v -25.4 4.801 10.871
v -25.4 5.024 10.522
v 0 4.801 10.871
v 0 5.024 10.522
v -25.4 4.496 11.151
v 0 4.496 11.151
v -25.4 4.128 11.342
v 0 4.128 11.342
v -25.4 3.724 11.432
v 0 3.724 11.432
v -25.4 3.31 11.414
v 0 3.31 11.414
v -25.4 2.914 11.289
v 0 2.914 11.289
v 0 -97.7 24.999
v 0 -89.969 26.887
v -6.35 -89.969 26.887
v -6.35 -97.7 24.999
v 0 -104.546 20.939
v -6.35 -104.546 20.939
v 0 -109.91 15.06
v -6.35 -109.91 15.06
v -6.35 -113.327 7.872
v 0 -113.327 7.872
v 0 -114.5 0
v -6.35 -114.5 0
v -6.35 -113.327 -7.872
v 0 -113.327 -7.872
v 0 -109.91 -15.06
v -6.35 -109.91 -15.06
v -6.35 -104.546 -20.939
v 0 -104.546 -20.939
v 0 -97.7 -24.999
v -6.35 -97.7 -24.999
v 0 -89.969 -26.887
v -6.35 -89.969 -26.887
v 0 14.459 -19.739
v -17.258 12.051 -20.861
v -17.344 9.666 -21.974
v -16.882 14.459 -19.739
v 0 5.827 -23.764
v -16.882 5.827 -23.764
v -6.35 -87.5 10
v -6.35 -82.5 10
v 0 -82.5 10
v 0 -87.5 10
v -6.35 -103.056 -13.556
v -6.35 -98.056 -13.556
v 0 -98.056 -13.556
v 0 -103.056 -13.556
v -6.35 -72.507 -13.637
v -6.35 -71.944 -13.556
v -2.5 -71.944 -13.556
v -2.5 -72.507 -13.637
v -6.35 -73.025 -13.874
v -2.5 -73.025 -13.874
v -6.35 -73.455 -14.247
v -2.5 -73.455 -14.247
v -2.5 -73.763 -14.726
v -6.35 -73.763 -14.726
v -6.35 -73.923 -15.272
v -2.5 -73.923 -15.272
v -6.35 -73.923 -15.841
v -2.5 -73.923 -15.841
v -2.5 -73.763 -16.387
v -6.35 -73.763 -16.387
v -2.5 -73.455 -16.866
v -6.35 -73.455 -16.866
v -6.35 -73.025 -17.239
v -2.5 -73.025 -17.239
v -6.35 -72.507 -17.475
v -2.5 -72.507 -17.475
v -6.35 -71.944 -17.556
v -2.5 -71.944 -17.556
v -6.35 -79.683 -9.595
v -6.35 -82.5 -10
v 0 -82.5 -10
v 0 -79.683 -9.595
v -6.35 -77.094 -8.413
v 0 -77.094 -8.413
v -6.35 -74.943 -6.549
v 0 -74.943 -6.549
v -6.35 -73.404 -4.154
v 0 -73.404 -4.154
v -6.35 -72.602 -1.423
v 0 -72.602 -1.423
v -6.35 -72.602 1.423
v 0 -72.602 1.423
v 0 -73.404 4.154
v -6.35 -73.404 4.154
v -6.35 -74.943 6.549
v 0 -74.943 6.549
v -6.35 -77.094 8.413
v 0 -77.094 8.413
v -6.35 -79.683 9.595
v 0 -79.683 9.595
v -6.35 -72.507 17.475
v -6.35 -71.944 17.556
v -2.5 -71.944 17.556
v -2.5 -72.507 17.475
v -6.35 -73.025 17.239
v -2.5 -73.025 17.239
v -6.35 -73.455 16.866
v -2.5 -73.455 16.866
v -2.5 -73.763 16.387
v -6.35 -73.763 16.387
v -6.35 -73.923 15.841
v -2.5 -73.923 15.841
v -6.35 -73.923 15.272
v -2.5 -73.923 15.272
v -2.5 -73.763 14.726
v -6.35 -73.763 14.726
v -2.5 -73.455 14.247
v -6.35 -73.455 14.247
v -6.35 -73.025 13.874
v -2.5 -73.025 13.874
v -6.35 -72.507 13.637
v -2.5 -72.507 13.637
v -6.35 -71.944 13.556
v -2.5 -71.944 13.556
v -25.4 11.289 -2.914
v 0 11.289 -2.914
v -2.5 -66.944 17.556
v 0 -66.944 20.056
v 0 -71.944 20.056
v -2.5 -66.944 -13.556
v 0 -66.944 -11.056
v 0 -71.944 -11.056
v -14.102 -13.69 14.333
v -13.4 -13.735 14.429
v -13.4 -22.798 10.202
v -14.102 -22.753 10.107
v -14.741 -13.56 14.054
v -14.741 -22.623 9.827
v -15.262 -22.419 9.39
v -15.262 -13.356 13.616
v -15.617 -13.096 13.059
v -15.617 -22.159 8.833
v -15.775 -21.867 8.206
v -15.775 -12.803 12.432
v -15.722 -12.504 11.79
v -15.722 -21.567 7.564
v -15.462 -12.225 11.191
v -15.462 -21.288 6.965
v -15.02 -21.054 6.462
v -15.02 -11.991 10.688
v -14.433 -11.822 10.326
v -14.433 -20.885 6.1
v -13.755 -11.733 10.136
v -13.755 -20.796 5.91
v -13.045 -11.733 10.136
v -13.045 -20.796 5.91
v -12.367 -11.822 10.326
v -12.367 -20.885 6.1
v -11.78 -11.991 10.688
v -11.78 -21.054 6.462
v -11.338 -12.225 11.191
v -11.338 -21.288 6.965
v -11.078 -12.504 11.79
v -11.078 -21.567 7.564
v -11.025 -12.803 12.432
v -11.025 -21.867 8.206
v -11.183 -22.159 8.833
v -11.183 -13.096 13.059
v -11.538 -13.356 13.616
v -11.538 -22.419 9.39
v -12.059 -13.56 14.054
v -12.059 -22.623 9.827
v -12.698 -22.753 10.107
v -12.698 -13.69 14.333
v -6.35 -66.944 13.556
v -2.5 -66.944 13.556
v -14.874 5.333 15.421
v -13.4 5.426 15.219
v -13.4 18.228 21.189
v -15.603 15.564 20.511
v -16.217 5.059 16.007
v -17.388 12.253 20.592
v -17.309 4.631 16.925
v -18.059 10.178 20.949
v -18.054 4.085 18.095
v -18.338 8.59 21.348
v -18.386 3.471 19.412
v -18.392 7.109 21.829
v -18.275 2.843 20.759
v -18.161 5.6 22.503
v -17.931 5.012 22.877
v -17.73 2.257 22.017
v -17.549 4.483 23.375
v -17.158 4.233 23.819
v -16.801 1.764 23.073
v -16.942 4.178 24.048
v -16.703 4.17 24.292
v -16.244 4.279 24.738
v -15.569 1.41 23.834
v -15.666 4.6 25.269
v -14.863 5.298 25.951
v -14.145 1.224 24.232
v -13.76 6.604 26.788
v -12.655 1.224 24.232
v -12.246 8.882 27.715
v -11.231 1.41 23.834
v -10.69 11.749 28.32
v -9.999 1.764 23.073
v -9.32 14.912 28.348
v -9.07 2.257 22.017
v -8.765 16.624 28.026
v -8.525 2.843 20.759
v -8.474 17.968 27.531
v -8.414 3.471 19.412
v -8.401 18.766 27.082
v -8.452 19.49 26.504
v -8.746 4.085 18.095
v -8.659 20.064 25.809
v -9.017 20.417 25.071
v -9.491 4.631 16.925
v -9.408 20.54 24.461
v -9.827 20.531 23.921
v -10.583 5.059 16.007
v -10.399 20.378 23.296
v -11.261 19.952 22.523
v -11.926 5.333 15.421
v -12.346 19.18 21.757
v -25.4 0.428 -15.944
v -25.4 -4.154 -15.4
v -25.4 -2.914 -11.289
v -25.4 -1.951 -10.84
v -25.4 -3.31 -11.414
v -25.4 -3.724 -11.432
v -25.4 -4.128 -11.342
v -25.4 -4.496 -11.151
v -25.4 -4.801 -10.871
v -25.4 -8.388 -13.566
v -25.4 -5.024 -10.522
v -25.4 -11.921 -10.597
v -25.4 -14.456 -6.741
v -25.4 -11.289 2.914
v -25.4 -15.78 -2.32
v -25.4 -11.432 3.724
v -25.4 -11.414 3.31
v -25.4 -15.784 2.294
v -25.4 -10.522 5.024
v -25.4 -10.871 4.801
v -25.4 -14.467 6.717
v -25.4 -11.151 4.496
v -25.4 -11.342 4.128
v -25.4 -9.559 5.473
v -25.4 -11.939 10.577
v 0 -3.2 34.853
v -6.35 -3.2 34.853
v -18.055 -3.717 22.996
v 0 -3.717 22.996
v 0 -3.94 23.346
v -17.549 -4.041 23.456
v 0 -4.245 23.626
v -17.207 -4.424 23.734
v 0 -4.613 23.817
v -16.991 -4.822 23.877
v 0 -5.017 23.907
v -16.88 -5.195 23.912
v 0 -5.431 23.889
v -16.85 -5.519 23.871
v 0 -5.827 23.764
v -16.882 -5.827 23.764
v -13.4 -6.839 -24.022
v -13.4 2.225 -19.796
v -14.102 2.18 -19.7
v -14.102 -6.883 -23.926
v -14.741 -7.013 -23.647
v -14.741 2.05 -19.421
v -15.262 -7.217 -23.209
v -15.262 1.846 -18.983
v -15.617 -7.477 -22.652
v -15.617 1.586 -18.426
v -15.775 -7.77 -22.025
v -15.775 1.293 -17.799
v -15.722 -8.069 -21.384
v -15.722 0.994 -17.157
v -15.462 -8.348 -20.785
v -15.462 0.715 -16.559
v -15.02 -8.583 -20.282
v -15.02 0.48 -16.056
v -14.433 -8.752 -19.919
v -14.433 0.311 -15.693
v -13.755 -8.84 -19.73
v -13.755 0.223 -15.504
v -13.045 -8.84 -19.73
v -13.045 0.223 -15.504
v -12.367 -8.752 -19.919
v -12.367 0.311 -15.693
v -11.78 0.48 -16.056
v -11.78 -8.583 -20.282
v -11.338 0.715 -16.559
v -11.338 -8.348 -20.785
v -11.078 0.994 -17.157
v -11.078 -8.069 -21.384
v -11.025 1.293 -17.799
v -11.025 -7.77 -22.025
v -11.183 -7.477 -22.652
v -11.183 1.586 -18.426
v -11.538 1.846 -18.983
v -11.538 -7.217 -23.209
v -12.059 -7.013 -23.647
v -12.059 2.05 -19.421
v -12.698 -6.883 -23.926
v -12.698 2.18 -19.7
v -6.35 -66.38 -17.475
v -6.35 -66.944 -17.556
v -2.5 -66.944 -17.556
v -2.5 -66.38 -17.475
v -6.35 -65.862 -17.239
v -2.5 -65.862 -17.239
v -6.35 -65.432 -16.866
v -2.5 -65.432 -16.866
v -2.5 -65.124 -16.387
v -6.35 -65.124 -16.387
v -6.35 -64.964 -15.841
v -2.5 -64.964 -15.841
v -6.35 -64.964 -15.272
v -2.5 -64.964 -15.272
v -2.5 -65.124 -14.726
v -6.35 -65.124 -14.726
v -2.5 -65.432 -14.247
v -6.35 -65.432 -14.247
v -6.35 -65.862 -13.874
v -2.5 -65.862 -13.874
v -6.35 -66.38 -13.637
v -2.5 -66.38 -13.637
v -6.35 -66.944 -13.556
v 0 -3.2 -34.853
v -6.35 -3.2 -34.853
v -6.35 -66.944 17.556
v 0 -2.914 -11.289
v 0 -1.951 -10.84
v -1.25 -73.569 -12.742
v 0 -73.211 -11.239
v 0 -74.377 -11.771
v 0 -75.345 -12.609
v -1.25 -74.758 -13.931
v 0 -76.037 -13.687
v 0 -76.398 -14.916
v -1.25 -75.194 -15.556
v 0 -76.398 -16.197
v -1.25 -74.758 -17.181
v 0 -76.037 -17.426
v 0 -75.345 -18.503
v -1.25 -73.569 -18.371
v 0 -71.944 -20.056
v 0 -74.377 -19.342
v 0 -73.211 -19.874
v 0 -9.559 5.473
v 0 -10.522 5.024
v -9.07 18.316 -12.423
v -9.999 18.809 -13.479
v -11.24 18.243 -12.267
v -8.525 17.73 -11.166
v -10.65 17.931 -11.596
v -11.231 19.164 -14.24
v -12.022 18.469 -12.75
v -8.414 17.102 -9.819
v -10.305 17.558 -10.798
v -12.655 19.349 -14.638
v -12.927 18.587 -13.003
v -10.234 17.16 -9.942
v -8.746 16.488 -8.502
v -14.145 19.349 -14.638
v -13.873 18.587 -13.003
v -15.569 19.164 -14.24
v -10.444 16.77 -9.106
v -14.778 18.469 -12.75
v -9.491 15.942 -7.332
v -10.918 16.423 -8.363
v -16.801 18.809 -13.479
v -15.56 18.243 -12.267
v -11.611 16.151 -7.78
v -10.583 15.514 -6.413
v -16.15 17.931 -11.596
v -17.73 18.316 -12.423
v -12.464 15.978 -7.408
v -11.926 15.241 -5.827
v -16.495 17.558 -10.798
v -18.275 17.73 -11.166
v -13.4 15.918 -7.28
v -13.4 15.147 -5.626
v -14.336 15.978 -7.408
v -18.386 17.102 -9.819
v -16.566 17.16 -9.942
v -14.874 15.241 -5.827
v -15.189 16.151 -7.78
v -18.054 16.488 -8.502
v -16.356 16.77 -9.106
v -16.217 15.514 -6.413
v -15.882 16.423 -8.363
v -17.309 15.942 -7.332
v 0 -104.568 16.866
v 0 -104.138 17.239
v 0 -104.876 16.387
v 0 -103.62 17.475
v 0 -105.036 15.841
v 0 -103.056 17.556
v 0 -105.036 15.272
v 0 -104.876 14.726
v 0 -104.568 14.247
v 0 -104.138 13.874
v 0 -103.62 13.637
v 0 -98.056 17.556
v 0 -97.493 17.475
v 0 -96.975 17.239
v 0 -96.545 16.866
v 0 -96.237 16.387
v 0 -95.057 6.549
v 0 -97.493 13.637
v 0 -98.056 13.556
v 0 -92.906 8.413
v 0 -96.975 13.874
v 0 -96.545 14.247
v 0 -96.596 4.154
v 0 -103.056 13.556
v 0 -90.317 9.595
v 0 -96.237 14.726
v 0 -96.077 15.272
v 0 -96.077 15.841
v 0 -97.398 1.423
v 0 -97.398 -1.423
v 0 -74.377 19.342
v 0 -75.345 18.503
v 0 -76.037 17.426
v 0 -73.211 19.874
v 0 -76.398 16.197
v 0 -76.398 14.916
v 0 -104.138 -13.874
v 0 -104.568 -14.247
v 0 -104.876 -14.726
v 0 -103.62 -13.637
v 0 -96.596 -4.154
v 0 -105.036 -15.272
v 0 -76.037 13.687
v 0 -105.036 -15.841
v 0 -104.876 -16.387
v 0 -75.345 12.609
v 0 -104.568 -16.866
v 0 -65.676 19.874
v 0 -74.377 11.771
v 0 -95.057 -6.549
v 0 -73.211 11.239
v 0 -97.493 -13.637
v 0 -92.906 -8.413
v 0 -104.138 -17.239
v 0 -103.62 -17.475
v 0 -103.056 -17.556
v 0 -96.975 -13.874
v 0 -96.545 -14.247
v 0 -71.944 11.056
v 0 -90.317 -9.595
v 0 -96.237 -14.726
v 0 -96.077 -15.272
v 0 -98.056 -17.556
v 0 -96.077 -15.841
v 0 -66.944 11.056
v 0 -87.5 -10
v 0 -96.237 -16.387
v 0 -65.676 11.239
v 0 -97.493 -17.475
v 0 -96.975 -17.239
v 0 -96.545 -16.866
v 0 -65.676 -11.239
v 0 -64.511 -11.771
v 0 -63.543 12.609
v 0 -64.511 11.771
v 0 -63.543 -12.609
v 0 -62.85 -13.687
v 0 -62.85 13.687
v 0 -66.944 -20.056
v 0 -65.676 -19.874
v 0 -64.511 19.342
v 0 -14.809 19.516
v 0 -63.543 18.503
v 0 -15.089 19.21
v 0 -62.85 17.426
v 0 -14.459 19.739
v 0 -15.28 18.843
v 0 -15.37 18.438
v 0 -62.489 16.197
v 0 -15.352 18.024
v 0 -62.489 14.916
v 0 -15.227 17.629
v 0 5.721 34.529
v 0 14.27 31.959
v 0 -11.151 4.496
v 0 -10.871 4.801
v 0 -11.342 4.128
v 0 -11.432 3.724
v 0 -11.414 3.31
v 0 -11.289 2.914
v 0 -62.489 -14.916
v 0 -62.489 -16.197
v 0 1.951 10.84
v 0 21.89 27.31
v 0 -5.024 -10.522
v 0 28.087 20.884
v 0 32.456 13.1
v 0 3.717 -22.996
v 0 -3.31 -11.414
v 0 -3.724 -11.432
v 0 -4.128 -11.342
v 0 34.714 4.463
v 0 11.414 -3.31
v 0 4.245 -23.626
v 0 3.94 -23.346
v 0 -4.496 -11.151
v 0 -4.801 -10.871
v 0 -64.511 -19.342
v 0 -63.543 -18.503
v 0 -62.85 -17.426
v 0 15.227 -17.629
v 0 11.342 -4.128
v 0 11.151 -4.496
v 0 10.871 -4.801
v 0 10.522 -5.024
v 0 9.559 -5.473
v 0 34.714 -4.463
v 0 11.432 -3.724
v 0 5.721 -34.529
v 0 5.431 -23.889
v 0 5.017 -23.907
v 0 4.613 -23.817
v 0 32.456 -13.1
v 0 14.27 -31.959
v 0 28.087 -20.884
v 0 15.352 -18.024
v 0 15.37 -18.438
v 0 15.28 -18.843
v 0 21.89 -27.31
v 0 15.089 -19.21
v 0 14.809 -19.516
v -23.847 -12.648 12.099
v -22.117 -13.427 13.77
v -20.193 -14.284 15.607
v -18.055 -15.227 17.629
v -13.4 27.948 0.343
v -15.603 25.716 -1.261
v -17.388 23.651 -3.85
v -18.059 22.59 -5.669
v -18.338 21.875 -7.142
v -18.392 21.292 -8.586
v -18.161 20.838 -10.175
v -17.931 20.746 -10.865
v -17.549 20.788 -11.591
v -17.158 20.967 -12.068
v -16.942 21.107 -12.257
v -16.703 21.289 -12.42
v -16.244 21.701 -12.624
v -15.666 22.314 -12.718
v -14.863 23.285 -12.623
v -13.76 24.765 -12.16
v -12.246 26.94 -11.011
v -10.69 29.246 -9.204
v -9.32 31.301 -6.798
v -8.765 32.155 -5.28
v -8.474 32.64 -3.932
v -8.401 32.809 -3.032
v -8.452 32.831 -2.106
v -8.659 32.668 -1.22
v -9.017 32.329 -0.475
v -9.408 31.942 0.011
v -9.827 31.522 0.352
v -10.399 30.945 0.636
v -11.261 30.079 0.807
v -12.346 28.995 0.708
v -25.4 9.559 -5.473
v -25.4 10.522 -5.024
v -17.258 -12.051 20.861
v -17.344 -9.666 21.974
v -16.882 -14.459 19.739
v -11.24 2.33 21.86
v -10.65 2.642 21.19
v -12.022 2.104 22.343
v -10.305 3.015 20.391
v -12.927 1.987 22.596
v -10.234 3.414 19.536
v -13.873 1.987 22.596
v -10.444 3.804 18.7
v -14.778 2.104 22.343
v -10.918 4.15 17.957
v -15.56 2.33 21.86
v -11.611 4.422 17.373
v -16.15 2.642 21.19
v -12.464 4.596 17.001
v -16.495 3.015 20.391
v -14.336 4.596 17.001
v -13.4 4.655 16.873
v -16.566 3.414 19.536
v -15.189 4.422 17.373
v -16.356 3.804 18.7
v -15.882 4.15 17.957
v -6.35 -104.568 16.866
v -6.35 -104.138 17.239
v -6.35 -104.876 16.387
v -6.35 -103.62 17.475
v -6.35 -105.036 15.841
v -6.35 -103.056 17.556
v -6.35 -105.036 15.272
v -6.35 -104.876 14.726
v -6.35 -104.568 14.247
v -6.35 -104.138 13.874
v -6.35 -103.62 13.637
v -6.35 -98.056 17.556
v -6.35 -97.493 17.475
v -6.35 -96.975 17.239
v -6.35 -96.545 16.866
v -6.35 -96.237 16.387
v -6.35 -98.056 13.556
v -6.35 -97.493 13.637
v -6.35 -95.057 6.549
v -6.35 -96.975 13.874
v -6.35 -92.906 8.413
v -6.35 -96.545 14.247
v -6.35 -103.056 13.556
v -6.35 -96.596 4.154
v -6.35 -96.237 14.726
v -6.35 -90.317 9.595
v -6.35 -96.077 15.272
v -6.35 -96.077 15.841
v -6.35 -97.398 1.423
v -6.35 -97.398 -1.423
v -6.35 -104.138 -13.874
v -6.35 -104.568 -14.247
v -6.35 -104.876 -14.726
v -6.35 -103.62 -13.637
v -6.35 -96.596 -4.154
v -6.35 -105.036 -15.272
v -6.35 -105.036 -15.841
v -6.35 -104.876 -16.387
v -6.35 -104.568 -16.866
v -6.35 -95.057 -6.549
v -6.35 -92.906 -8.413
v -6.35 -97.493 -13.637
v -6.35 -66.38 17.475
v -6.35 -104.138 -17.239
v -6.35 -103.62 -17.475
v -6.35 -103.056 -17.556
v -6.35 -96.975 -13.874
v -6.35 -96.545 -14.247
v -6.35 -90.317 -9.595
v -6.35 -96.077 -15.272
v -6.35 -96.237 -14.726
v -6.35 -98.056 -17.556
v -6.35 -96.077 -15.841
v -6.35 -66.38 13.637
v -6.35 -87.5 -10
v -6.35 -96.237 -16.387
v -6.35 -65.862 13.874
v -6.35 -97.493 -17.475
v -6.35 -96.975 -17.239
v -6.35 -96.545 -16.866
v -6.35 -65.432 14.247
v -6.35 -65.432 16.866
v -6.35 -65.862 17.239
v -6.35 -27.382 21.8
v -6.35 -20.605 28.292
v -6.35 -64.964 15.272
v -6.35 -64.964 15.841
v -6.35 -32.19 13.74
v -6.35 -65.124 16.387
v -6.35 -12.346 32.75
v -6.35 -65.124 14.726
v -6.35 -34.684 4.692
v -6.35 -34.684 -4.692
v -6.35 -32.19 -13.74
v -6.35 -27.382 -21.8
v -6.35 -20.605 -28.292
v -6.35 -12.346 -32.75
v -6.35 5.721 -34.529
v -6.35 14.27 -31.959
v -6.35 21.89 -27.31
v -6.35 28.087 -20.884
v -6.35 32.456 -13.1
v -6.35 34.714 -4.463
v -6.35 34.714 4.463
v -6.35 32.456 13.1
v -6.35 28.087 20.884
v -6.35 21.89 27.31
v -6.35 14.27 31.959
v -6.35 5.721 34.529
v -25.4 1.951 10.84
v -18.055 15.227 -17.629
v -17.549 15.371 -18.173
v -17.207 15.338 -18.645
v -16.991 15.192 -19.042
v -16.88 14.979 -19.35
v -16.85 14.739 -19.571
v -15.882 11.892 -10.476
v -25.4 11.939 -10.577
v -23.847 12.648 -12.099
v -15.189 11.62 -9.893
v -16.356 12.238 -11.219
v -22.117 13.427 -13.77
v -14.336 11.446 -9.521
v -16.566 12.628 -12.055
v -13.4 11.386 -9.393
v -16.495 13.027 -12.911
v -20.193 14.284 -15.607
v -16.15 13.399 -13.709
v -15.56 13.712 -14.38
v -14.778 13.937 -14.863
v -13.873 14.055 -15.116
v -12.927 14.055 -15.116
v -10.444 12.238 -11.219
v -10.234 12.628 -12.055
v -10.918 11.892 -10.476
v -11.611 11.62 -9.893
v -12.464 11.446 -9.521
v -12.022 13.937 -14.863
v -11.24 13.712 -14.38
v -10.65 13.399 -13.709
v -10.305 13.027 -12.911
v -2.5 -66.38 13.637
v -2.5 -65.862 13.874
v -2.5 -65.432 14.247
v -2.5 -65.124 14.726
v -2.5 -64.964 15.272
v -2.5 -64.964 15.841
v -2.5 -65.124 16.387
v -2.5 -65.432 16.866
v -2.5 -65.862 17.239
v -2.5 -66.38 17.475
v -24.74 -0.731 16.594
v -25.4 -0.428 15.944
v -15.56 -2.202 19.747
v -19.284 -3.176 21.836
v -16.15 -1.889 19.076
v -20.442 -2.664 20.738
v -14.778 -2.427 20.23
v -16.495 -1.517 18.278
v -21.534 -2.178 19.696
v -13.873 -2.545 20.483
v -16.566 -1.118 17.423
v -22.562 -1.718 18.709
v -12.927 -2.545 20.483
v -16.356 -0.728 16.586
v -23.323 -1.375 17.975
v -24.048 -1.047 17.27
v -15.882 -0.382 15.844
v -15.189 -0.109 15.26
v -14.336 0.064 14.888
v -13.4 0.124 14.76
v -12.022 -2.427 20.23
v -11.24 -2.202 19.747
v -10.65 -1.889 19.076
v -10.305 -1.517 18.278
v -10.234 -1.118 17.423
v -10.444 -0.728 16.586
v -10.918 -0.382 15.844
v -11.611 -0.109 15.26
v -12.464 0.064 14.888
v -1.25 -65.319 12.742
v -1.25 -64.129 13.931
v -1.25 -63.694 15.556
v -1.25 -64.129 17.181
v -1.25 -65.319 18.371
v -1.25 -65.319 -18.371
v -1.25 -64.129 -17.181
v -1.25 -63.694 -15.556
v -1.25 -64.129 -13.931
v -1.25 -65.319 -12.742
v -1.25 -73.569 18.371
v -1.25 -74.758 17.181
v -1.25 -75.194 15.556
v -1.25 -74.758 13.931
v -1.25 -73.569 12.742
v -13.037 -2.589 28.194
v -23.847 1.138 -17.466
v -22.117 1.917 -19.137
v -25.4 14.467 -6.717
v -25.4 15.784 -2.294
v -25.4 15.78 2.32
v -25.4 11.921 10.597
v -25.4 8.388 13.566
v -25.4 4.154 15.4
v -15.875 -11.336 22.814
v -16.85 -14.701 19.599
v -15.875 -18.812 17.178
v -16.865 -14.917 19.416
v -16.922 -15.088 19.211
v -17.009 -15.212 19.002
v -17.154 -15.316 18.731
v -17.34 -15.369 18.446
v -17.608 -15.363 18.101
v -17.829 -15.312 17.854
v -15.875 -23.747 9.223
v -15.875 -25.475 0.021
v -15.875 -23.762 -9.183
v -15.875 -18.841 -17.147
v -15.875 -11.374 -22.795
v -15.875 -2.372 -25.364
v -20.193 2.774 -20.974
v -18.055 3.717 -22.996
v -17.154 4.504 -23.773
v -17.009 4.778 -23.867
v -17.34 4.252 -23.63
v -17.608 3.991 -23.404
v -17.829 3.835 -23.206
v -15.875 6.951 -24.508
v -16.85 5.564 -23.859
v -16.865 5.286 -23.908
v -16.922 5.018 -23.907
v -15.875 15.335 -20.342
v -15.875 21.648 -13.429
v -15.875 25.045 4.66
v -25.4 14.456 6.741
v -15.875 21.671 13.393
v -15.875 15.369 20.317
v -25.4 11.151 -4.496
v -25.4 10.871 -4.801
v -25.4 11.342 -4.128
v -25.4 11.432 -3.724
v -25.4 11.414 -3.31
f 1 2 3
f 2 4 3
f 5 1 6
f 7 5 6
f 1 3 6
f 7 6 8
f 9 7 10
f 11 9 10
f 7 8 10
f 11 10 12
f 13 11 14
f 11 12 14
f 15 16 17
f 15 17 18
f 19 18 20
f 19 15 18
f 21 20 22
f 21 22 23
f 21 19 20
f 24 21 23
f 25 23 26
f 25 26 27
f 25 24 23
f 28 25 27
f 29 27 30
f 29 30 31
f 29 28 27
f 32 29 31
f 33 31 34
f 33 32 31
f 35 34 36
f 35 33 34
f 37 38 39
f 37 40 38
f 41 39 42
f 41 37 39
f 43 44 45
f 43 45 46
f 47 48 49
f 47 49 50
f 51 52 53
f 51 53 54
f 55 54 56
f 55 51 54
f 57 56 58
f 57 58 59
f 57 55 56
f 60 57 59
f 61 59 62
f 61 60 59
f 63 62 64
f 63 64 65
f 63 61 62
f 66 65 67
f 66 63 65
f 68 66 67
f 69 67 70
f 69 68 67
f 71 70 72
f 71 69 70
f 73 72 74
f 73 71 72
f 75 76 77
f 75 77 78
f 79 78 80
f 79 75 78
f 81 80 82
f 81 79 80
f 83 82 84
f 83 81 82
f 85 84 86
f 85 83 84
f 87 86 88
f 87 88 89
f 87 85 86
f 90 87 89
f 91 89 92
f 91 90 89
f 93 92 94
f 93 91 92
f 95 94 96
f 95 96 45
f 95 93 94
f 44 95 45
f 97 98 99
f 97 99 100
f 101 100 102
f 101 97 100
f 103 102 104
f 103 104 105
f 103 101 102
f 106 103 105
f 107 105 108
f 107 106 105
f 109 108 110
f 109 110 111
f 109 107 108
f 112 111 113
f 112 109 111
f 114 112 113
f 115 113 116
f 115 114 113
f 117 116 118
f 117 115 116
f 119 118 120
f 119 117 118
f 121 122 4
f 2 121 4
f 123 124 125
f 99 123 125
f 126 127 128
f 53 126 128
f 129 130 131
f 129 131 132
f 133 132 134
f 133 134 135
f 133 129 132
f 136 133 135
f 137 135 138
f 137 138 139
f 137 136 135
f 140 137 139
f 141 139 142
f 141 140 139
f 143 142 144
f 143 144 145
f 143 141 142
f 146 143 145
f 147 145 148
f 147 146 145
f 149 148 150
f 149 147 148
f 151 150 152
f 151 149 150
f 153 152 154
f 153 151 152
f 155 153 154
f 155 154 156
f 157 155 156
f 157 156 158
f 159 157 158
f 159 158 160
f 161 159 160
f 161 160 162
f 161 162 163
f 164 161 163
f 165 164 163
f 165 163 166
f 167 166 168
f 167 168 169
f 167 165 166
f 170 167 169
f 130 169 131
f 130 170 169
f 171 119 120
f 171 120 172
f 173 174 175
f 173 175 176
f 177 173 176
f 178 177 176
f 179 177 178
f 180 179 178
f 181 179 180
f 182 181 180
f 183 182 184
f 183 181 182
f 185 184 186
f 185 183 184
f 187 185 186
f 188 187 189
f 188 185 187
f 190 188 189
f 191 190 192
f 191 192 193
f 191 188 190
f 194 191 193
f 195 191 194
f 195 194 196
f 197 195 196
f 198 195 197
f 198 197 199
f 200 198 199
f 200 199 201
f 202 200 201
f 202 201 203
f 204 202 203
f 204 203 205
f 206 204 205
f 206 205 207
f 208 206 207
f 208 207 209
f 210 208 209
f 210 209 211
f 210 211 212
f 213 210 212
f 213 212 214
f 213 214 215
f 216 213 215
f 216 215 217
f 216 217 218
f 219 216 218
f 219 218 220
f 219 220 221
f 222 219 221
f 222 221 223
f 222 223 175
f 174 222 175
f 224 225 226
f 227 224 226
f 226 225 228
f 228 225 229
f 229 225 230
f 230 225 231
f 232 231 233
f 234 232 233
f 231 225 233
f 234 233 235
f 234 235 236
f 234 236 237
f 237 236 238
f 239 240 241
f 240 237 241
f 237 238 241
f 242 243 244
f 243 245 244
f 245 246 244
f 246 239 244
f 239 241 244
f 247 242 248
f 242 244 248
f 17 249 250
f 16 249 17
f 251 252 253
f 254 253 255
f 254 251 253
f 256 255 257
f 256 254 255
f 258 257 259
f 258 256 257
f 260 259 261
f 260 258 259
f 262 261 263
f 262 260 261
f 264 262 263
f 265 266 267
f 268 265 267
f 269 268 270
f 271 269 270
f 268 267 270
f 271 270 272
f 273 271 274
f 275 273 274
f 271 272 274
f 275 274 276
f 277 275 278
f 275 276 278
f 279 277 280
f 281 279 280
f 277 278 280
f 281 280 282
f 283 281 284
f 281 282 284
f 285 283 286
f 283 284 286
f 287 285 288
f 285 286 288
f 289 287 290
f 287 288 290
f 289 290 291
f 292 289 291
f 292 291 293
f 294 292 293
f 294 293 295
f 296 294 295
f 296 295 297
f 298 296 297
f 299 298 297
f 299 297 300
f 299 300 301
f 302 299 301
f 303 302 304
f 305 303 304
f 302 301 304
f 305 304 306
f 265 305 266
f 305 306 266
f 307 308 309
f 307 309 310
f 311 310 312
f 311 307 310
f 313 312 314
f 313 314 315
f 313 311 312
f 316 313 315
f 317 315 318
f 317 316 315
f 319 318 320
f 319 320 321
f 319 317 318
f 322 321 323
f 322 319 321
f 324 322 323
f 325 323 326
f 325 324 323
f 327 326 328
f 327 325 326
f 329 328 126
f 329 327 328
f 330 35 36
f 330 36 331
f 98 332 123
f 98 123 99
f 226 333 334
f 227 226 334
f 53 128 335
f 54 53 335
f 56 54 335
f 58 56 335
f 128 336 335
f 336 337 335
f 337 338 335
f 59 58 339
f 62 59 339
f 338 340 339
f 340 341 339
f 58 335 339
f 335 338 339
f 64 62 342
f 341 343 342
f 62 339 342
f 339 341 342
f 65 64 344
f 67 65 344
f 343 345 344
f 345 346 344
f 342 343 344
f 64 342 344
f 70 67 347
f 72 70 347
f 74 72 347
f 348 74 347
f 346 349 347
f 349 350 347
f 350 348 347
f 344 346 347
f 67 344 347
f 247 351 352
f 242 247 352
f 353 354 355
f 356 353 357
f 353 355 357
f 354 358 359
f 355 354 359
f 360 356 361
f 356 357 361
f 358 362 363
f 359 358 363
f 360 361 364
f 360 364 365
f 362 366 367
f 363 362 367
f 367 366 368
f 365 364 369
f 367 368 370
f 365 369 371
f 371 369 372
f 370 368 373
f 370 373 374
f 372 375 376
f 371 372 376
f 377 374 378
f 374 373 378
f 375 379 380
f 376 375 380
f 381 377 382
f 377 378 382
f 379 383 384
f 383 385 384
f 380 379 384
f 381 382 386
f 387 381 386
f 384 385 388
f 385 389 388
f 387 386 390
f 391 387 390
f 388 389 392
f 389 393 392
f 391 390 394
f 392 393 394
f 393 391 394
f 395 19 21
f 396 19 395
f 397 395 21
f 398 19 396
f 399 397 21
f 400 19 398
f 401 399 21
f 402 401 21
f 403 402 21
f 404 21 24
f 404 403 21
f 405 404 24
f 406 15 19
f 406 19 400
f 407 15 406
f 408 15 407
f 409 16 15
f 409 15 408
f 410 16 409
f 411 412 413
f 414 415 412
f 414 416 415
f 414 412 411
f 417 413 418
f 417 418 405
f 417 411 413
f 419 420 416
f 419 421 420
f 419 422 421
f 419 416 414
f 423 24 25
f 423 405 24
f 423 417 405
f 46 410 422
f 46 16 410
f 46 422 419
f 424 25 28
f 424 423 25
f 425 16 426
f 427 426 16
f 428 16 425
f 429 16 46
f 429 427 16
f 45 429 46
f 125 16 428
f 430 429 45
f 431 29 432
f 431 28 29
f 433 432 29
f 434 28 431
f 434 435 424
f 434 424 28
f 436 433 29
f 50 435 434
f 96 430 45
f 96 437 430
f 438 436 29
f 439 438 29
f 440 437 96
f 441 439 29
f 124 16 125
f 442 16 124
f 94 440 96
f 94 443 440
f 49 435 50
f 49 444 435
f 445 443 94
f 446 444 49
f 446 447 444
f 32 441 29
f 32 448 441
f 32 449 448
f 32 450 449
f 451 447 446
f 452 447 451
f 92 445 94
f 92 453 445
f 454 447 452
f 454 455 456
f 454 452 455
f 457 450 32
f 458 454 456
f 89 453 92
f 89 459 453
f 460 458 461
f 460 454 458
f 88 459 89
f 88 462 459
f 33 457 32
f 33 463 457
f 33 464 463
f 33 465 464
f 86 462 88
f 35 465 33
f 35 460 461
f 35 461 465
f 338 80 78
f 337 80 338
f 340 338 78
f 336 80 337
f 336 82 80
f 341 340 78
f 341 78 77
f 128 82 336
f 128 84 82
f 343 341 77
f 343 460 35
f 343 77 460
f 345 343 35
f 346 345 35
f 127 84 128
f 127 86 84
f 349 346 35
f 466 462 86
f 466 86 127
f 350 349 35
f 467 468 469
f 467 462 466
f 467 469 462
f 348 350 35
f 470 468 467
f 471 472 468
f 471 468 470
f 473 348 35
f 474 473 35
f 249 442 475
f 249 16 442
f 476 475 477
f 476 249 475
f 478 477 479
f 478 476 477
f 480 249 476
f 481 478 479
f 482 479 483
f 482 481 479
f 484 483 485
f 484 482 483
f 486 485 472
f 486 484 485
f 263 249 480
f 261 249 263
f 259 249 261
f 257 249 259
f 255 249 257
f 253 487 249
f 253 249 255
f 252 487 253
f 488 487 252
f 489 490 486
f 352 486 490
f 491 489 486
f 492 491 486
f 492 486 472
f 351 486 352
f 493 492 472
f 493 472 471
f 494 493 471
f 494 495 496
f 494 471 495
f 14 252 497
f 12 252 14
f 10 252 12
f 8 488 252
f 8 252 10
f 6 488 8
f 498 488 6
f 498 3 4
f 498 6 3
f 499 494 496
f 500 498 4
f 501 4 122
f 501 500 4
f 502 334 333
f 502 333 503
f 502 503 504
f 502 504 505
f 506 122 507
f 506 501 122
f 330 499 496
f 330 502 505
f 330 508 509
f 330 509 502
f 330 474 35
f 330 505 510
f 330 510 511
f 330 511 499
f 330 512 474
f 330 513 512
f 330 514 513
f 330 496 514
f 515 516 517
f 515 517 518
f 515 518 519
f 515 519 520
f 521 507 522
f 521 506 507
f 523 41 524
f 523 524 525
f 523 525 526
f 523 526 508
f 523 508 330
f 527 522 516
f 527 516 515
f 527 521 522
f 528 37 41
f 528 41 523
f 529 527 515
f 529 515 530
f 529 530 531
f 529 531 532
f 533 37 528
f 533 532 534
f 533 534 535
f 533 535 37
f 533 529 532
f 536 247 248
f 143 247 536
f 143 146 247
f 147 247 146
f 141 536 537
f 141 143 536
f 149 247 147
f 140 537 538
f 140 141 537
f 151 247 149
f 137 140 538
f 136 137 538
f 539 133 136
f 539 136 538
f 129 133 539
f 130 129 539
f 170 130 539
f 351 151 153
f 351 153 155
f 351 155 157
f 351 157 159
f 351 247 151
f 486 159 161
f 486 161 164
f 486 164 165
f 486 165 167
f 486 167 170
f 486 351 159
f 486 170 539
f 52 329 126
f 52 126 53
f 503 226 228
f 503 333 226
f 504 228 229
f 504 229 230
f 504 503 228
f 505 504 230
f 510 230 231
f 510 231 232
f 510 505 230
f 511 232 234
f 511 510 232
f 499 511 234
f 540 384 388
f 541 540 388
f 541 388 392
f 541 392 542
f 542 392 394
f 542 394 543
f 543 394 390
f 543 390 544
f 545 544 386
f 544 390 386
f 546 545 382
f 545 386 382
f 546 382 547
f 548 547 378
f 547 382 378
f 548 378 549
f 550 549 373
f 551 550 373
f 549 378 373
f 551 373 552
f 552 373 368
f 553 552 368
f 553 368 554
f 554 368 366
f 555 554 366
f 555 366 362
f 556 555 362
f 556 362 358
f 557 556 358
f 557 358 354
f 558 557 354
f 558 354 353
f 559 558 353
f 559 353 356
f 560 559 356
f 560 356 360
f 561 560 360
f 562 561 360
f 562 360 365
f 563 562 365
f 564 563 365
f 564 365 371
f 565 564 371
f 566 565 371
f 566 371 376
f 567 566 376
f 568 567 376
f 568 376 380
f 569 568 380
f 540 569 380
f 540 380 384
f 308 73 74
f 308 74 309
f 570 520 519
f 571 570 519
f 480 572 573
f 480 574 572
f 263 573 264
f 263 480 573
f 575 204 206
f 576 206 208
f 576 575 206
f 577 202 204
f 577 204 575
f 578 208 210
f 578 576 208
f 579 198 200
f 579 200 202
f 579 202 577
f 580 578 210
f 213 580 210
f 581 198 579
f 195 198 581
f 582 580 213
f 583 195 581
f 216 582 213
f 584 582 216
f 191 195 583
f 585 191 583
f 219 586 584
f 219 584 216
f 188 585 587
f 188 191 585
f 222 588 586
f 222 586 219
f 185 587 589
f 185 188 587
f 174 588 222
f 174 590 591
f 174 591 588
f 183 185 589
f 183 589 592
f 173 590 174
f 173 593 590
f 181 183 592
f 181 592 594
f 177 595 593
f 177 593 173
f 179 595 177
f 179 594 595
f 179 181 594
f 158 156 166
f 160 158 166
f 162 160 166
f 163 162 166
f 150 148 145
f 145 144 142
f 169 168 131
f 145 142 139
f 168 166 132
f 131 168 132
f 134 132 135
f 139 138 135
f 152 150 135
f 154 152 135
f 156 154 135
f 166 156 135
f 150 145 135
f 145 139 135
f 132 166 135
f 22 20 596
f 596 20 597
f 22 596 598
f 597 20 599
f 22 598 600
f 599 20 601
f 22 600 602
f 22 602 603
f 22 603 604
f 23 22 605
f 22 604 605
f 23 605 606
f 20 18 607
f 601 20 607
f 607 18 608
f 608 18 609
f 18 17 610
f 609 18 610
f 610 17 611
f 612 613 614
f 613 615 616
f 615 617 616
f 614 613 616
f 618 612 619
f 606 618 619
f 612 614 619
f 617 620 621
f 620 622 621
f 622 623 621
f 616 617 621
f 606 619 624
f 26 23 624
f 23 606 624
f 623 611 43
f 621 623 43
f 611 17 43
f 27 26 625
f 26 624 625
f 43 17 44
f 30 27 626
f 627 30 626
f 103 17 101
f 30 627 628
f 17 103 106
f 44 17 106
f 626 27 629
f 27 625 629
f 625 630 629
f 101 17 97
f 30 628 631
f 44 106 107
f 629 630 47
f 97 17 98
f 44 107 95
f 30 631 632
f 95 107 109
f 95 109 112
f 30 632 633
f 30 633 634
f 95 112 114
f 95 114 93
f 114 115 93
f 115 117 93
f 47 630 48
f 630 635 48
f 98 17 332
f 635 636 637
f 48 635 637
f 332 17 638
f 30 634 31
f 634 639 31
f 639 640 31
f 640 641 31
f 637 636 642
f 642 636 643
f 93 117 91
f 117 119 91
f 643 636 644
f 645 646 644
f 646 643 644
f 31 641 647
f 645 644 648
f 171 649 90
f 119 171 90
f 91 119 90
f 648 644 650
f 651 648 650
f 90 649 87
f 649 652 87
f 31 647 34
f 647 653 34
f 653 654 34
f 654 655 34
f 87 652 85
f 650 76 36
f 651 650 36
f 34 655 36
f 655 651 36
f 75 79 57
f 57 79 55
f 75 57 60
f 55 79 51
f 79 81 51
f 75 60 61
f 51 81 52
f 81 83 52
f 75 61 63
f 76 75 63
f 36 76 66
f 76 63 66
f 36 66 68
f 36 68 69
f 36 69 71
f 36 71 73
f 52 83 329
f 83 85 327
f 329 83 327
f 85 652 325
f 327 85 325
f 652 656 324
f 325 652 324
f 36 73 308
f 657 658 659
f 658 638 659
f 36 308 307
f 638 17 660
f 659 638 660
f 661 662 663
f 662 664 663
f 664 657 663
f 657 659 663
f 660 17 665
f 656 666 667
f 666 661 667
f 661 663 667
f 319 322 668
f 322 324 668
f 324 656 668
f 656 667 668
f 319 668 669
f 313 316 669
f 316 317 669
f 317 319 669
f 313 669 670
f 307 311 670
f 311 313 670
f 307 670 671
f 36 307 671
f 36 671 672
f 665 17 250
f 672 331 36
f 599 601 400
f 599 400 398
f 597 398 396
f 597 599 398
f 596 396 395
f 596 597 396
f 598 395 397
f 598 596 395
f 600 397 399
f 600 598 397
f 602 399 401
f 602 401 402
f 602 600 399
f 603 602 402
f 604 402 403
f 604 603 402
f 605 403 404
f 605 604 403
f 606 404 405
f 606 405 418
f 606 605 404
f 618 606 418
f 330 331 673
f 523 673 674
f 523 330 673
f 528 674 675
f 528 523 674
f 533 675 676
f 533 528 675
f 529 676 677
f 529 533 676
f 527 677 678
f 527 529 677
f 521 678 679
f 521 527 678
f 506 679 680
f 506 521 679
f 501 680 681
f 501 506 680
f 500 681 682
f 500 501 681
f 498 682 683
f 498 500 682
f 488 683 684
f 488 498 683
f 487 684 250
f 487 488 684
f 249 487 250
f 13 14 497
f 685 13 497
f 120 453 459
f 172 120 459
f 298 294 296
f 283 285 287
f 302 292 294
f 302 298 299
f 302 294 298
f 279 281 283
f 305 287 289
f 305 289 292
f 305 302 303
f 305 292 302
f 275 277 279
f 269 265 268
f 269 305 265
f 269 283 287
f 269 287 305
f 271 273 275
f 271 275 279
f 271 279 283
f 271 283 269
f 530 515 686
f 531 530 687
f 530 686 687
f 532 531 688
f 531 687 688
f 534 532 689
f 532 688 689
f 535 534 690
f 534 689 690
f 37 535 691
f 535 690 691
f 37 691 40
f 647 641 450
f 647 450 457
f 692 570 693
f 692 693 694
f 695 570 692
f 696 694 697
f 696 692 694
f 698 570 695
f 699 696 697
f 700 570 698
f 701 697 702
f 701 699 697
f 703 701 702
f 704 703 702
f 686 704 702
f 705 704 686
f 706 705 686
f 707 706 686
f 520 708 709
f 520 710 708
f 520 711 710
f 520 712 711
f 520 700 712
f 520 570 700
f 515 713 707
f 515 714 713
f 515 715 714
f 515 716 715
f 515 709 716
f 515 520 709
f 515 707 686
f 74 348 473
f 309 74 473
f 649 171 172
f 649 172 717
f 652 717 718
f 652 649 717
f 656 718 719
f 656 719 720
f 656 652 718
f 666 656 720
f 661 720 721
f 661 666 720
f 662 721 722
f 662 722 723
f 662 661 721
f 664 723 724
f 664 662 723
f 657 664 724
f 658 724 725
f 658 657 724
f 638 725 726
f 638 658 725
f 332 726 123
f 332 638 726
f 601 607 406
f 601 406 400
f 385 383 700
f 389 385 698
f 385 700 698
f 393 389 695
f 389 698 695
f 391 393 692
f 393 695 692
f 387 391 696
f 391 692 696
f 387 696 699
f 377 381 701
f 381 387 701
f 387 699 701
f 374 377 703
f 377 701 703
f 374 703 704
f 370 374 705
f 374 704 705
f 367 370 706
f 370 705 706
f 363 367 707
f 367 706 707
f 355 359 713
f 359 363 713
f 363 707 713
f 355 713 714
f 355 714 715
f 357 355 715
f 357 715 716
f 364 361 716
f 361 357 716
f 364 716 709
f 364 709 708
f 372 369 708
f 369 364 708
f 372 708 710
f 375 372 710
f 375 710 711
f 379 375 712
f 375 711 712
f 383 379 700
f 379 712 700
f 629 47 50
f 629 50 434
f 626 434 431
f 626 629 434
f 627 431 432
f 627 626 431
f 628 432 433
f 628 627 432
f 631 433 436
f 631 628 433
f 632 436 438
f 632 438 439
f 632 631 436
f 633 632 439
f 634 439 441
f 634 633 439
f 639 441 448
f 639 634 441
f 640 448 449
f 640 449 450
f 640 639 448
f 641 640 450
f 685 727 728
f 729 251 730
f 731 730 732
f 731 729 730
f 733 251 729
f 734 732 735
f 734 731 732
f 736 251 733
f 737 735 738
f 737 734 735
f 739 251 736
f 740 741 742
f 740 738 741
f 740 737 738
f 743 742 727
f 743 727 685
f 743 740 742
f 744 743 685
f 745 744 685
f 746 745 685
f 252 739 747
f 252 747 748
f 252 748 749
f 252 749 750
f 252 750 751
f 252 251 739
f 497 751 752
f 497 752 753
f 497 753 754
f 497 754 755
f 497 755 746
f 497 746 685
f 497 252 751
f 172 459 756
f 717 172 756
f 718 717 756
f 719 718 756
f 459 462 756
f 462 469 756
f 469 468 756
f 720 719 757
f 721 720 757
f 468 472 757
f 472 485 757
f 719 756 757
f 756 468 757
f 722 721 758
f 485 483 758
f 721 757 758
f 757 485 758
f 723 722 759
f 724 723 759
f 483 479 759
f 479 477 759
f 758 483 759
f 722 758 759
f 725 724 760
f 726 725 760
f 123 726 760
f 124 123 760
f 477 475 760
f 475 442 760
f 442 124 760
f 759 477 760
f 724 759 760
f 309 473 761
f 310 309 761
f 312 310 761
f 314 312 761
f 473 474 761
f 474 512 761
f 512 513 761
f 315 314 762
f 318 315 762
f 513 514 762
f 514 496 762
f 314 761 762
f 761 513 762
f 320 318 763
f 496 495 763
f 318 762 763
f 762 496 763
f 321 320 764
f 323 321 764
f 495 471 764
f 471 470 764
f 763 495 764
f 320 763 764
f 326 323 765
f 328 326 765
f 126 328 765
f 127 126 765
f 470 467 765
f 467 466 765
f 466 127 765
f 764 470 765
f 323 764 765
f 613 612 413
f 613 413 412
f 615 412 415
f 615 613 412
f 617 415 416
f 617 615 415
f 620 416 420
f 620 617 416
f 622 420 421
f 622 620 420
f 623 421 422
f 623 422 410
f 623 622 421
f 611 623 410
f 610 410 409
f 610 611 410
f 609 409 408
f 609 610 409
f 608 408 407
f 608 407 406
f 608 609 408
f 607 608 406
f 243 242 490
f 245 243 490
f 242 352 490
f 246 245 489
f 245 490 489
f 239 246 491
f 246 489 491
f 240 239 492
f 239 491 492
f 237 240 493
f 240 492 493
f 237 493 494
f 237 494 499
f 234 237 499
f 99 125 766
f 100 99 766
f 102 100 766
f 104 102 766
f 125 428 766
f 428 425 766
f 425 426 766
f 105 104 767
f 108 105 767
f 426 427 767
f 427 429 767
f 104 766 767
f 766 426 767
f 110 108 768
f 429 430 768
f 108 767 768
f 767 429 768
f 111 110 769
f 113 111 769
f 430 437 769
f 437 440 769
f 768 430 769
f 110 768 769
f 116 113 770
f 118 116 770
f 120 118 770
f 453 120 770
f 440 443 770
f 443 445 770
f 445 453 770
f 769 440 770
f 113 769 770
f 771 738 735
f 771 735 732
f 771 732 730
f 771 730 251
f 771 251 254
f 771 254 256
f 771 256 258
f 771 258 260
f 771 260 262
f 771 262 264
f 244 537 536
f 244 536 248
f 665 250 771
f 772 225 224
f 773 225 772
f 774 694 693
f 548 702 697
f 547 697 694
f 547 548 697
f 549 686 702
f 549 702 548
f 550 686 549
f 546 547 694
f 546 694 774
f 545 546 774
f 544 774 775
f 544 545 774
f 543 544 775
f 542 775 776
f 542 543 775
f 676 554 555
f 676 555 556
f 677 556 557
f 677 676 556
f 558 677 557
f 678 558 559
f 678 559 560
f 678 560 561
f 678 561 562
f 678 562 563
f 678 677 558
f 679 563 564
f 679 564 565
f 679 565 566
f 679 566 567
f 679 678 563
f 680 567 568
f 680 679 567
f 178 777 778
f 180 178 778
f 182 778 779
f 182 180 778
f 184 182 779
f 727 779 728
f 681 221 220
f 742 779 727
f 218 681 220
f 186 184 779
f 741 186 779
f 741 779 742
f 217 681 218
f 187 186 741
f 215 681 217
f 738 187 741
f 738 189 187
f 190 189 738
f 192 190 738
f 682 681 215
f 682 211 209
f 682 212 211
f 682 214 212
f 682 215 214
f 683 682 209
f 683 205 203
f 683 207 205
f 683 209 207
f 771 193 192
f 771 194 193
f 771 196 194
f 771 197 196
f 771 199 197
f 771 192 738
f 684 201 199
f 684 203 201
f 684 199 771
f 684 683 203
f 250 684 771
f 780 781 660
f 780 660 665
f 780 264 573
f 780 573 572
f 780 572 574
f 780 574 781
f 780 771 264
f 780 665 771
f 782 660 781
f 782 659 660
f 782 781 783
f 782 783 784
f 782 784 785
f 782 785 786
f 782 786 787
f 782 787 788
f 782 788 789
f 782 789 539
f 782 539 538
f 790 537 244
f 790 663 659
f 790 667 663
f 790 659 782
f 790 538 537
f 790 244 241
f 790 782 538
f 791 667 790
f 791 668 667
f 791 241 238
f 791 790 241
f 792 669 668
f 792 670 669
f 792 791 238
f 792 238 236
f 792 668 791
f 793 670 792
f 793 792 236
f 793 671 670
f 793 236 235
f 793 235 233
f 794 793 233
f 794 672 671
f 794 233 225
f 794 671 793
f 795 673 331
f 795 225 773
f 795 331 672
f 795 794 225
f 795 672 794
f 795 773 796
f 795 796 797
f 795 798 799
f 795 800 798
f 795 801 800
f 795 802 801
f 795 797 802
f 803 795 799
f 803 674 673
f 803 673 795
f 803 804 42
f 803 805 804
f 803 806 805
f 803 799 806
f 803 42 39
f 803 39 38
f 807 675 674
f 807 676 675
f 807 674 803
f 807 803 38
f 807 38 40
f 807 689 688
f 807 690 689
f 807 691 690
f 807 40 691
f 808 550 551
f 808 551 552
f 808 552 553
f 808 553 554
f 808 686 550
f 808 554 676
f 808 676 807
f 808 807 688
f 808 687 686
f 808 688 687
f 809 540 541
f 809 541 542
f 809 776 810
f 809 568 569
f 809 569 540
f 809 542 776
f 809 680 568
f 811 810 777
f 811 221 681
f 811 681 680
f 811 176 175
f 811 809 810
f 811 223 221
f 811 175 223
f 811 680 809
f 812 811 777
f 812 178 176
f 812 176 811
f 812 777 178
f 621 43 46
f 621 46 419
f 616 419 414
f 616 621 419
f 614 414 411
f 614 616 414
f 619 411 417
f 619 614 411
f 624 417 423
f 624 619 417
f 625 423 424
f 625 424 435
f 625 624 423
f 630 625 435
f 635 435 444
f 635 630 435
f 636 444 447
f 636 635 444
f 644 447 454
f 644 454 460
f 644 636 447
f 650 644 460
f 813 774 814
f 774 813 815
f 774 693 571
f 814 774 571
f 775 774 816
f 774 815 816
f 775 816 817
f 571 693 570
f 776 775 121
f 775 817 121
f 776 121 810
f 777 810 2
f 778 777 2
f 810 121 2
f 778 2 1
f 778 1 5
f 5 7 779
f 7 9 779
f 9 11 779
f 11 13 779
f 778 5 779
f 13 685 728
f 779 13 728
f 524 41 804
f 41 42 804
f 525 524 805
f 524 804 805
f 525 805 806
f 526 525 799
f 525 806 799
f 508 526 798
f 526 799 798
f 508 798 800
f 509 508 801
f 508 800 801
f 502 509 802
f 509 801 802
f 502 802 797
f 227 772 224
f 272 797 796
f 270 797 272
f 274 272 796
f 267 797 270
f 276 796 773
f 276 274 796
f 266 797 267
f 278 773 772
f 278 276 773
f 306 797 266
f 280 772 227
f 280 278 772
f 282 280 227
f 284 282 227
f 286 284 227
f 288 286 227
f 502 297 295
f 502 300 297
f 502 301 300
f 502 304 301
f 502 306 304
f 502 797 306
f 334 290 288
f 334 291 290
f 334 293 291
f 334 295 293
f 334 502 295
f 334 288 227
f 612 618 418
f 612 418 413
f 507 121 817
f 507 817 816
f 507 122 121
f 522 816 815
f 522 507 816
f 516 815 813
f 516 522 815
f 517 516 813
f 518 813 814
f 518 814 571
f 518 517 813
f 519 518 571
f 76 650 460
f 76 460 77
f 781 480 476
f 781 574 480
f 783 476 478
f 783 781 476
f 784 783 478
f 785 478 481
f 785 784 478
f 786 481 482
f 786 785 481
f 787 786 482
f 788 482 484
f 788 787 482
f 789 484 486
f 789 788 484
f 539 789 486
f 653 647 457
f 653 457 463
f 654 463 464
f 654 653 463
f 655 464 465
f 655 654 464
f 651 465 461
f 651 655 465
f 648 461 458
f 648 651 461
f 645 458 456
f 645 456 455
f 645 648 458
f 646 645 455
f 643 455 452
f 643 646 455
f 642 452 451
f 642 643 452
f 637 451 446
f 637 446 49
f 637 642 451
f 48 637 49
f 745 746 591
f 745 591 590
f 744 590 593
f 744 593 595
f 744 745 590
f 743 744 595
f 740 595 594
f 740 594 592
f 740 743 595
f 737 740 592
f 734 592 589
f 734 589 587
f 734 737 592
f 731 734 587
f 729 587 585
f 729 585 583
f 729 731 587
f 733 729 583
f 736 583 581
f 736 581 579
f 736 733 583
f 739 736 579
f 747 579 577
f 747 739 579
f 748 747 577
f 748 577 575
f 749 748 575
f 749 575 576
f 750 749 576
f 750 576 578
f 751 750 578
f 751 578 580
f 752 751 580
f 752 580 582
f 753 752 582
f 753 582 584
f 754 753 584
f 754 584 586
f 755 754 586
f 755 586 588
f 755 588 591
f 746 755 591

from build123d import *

# Parameters (mm, degrees)
BOSS_EXTRUDE1_DEPTH = 6.35
SKETCH20_R          = 35
BOSS_EXTRUDE5_DEPTH = 19.05
CUT_EXTRUDE14_DEPTH = 123.39448517
CHAMFER1_SIZE       = 19.05
SKETCH22_R          = 3.175
CUT_EXTRUDE15_DEPTH = 129.555411344
SKETCH24_R          = 5
CUT_EXTRUDE16_DEPTH = 134.419011414
SKETCH25_R          = 2.38125
CUT_EXTRUDE17_DEPTH = 10
CUT_EXTRUDE18_DEPTH = 10
CHAMFER3_SIZE       = 2.5
FILLET1_R           = 1.5875


with BuildPart() as part:
    # Sketch1 → Boss-Extrude1 (new body)
    with BuildSketch(Plane(origin=(0, 0, 0), x_dir=(0, 0, -1), z_dir=(1, 0, 0))):
        with BuildLine():
            Line((-34.853407294, -3.2), (-26.886914198, -89.968571429))
            ThreePointArc((-26.886914198, -89.968571429), (0, -114.5), (26.886914198, -89.968571429))
            Line((26.886914198, -89.968571429), (34.853407294, -3.2))
            ThreePointArc((34.853407294, -3.2), (0, 35), (-34.853407294, -3.2))
        make_face()
        Polygon((4.353205728, 11.960334439), (-11.960334439, 4.353205728), (-4.353205728, -11.960334439), (11.960334439, -4.353205728), align=None, mode=Mode.SUBTRACT)
    extrude(amount=BOSS_EXTRUDE1_DEPTH)

    # Sketch20 → Boss-Extrude5 (add)
    with BuildSketch(Plane(origin=(6.35, 0, 0), x_dir=(0, 0, -1), z_dir=(1, 0, 0))):
        with Locations(Location((0, 0, 0), (0, 0, 185.245797084))):
            Circle(SKETCH20_R)
    extrude(amount=BOSS_EXTRUDE5_DEPTH)

    # Sketch21 → Cut-Extrude14 (cut, through all)
    with BuildSketch(Plane.ZY):
        Polygon((-19.067760927, 15.897892729), (-24.435012851, 4.387783834), (-10.840396045, -1.951490092), (-5.473144121, 9.558618803), align=None)
        Polygon((-11.960334439, -4.353205728), (-4.353205728, 11.960334439), (11.960334439, 4.353205728), (4.353205728, -11.960334439), align=None)
        Polygon((10.840396045, 1.951490092), (5.473144121, -9.558618803), (19.067760927, -15.897892729), (24.435012851, -4.387783834), align=None)
    extrude(amount=-CUT_EXTRUDE14_DEPTH, mode=Mode.SUBTRACT)

    # Chamfer1
    # the kernel refuses this chamfer: 19.05 mm, written as the material it takes off along each edge
    with BuildSketch(Plane(origin=(25.4, 0, 0), x_dir=(0, -0.09142857142327497, 0.9958116369713196), z_dir=(0, 0.9958116369713196, 0.09142857142327497))) as chamfer1_piece_1:
        Polygon((35 - CHAMFER1_SIZE, 0), (35, -CHAMFER1_SIZE), (35, 0), align=None)
    revolve(axis=Axis((25.4, 0, 0), (1, 0, 0)), mode=Mode.SUBTRACT)

    # Sketch22 → Cut-Extrude15 (cut, through all)
    with BuildSketch(Plane(origin=(0, 5.755054448, 2.683625962), x_dir=(-1, 0, 0), z_dir=(0, -0.9063077870366495, -0.4226182617407006))):
        with Locations(Location((-13.4, -16.5, 0), (0, 0, 90))):
            Circle(SKETCH22_R)
    cut_extrude15 = extrude(amount=-CUT_EXTRUDE15_DEPTH, mode=Mode.SUBTRACT)

    # Sketch24 → Cut-Extrude16 (cut, through all)
    with BuildSketch(Plane(origin=(0, 10.286593383, 4.796717271), x_dir=(-1, 0, 0), z_dir=(0, -0.9063077870366495, -0.4226182617407006))):
        with Locations(Location((-13.4, -16.5, 0), (0, 0, 90))):
            Circle(SKETCH24_R)
    cut_extrude16 = extrude(amount=-CUT_EXTRUDE16_DEPTH, mode=Mode.SUBTRACT)

    # Sketch25 → Cut-Extrude17 (cut)
    with BuildSketch(Plane(origin=(0, -5.755054448, -2.683625962), x_dir=(1, 0, 0), z_dir=(0, 0.9063077870366495, 0.4226182617407006))):
        with Locations(Location((13.4, -16.5, 0), (0, 0, 270))):
            Circle(SKETCH25_R)
    cut_extrude17 = extrude(amount=-CUT_EXTRUDE17_DEPTH, mode=Mode.SUBTRACT)

    # Mirror1: Cut-Extrude15, Cut-Extrude16, Cut-Extrude17 across plane
    add(cut_extrude15.mirror(Plane(origin=(0, 0, 0), x_dir=(1, 0, 0), z_dir=(0, 0.422618261740701, -0.9063077870366492))), mode=Mode.SUBTRACT)
    add(cut_extrude16.mirror(Plane(origin=(0, 0, 0), x_dir=(1, 0, 0), z_dir=(0, 0.422618261740701, -0.9063077870366492))), mode=Mode.SUBTRACT)
    add(cut_extrude17.mirror(Plane(origin=(0, 0, 0), x_dir=(1, 0, 0), z_dir=(0, 0.422618261740701, -0.9063077870366492))), mode=Mode.SUBTRACT)

    # Sketch19 → Cut-Extrude18 (cut)
    with BuildSketch(Plane(origin=(6.35, 0, 0), x_dir=(0, 0, -1), z_dir=(1, 0, 0))):
        with BuildLine():
            Line((13.556349186, -66.943650814), (13.556349186, -71.943650814))
            ThreePointArc((13.556349186, -71.943650814), (15.556349186, -73.943650814), (17.556349186, -71.943650814))
            Line((17.556349186, -71.943650814), (17.556349186, -66.943650814))
            ThreePointArc((17.556349186, -66.943650814), (15.556349186, -64.943650814), (13.556349186, -66.943650814))
        make_face()
        with BuildLine():
            Line((-10, -82.5), (-10, -87.5))
            ThreePointArc((-10, -87.5), (0, -97.5), (10, -87.5))
            Line((10, -87.5), (10, -82.5))
            ThreePointArc((10, -82.5), (0, -72.5), (-10, -82.5))
        make_face()
        with BuildLine():
            Line((17.556349186, -103.056349186), (17.556349186, -98.056349186))
            ThreePointArc((17.556349186, -98.056349186), (15.556349186, -96.056349186), (13.556349186, -98.056349186))
            Line((13.556349186, -98.056349186), (13.556349186, -103.056349186))
            ThreePointArc((13.556349186, -103.056349186), (15.556349186, -105.056349186), (17.556349186, -103.056349186))
        make_face()
        with BuildLine():
            Line((-17.556349186, -66.943650814), (-17.556349186, -71.943650814))
            ThreePointArc((-17.556349186, -71.943650814), (-15.556349186, -73.943650814), (-13.556349186, -71.943650814))
            Line((-13.556349186, -71.943650814), (-13.556349186, -66.943650814))
            ThreePointArc((-13.556349186, -66.943650814), (-15.556349186, -64.943650814), (-17.556349186, -66.943650814))
        make_face()
        with BuildLine():
            Line((-13.556349186, -103.056349186), (-13.556349186, -98.056349186))
            ThreePointArc((-13.556349186, -98.056349186), (-15.556349186, -96.056349186), (-17.556349186, -98.056349186))
            Line((-17.556349186, -98.056349186), (-17.556349186, -103.056349186))
            ThreePointArc((-17.556349186, -103.056349186), (-15.556349186, -105.056349186), (-13.556349186, -103.056349186))
        make_face()
    extrude(amount=-CUT_EXTRUDE18_DEPTH, mode=Mode.SUBTRACT)


with BuildPart() as body_2:
    # Mirror2: mirrored copy
    add(part.part.mirror(Plane(origin=(0, 0, 0), x_dir=(0, 0, 1), z_dir=(1, 0, 0))))

    # Chamfer3
    chamfer3_edges = [body_2.edges().sort_by_distance(p)[0] for p in [
        (0, -69.443650814, 13.556349186),
        (0, -64.943650814, 15.556349186),
        (0, -69.443650814, 17.556349186),
        (0, -73.943650814, 15.556349186),
        (0, -69.443650814, -17.556349186),
        (0, -64.943650814, -15.556349186),
        (0, -69.443650814, -13.556349186),
        (0, -73.943650814, -15.556349186),
    ]]
    chamfer(chamfer3_edges, length=CHAMFER3_SIZE)

    # Fillet1
    fillet1_edges = [body_2.edges().sort_by_distance(p)[0] for p in [
        (-8.262078305, 4.387783834, -24.435012851),
        (-8.262078305, 15.897892729, -19.067760927),
        (-8.262078305, -4.387783834, 24.435012851),
        (-8.262078305, -15.897892729, 19.067760927),
        (-12.7, 11.960334439, -4.353205728),
        (-12.7, 4.353205728, 11.960334439),
        (-12.7, -11.960334439, 4.353205728),
        (-12.7, -4.353205728, -11.960334439),
    ]]
    fillet(fillet1_edges, radius=FILLET1_R)


solid = body_2.part
